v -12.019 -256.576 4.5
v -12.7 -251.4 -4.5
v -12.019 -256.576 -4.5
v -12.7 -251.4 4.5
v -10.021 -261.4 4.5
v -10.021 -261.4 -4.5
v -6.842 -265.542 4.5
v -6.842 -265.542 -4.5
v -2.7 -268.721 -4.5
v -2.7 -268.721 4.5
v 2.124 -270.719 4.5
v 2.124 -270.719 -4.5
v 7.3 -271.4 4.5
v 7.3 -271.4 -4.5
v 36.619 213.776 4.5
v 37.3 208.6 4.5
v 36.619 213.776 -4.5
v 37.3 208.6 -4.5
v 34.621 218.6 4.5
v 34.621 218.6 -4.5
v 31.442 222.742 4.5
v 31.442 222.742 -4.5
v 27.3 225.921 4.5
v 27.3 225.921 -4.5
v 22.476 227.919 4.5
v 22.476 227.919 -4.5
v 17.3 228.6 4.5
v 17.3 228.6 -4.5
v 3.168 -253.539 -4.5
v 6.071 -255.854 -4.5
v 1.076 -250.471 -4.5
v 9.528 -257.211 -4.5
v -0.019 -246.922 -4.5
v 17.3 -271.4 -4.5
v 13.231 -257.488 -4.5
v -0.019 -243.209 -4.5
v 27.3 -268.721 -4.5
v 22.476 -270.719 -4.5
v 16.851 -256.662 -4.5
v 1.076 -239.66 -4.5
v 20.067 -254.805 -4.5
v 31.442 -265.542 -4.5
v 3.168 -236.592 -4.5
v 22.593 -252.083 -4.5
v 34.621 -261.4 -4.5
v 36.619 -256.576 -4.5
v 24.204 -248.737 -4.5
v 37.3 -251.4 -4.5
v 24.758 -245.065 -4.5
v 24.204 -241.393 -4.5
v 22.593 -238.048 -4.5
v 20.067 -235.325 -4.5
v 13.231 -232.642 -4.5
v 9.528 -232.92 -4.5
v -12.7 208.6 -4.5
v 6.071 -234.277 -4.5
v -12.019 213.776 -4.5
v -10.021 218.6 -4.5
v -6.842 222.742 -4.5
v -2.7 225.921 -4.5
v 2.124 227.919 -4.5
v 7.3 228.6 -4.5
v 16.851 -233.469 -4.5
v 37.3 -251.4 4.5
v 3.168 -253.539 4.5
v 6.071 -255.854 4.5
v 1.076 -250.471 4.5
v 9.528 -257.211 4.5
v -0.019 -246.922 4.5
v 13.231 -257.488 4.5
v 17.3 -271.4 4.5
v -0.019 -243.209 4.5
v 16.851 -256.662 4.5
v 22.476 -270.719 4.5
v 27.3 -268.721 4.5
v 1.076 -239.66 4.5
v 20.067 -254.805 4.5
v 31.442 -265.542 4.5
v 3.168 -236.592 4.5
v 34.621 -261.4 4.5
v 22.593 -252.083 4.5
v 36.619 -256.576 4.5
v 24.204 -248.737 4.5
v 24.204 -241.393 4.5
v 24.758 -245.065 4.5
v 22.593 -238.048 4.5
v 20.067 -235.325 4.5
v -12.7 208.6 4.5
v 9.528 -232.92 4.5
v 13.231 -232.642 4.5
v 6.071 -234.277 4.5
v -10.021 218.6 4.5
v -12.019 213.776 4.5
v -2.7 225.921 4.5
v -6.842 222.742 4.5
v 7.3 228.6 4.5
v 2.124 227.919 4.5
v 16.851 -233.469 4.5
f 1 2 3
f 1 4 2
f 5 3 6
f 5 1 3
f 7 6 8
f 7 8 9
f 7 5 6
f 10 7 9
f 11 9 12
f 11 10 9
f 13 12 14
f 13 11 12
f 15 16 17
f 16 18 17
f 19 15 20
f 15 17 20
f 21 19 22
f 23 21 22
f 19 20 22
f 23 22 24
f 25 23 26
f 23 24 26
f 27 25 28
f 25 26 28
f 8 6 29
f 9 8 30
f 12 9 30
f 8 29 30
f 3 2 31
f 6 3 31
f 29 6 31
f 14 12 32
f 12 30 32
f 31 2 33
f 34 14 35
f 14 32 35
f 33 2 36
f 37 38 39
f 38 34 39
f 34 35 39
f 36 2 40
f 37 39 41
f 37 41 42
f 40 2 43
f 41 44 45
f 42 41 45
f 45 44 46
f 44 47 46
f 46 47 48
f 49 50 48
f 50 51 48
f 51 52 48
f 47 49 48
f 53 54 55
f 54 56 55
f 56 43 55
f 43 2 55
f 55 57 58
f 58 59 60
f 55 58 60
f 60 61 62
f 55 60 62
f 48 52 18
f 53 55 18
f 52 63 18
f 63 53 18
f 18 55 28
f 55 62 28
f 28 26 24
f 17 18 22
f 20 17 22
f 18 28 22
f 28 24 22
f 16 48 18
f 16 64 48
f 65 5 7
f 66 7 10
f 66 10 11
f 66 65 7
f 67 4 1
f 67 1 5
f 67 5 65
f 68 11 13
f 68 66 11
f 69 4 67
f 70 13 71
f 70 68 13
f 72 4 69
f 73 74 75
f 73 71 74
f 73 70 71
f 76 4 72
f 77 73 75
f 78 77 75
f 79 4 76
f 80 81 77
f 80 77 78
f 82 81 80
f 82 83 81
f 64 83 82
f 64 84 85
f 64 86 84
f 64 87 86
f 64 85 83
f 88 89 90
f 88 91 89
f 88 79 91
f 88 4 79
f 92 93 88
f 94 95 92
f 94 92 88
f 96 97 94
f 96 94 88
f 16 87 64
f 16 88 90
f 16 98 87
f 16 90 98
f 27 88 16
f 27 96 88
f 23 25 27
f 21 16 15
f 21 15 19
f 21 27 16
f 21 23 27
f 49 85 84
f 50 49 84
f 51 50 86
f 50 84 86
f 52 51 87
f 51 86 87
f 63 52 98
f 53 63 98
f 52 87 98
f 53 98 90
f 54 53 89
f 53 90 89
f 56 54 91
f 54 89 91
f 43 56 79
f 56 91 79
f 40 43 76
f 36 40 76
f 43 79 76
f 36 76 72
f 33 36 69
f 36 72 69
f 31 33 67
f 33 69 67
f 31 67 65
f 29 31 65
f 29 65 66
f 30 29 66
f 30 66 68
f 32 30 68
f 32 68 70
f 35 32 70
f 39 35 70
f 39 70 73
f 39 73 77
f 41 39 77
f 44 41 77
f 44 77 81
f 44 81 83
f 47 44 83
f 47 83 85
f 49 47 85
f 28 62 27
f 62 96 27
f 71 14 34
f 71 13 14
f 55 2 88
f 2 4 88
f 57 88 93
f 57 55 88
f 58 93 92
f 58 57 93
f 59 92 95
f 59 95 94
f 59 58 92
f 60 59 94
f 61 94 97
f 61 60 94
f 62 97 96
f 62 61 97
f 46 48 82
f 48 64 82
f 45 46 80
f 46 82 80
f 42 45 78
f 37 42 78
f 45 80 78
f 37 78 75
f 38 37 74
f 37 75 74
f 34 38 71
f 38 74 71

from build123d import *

# Parameters (mm, degrees)
SKETCH7_W           = 50
SKETCH7_H           = 500
BOSS_EXTRUDE1_DEPTH = 4.5
FILLET1_R           = 20
SKETCH9_R           = 12.457833995
CUT_EXTRUDE2_DEPTH  = 10


with BuildPart() as part:
    # Sketch7 → Boss-Extrude1 (new, symmetric)
    with BuildSketch(Plane.XY):
        with Locations((12.3, -21.4)):
            Rectangle(SKETCH7_W, SKETCH7_H)
    extrude(amount=BOSS_EXTRUDE1_DEPTH, both=True)

    # Fillet1
    fillet1_edges = [part.edges().sort_by_distance(p)[0] for p in [
        (-12.7, 228.6, 0),
        (37.3, 228.6, 0),
        (37.3, -271.4, 0),
        (-12.7, -271.4, 0),
    ]]
    fillet(fillet1_edges, radius=FILLET1_R)

    # Sketch9 → Cut-Extrude2 (cut)
    with BuildSketch(Plane.XY.offset(4.5)):
        with Locations((12.3, -245.065350927)):
            Circle(SKETCH9_R)
    extrude(amount=-CUT_EXTRUDE2_DEPTH, mode=Mode.SUBTRACT)


solid = part.part
